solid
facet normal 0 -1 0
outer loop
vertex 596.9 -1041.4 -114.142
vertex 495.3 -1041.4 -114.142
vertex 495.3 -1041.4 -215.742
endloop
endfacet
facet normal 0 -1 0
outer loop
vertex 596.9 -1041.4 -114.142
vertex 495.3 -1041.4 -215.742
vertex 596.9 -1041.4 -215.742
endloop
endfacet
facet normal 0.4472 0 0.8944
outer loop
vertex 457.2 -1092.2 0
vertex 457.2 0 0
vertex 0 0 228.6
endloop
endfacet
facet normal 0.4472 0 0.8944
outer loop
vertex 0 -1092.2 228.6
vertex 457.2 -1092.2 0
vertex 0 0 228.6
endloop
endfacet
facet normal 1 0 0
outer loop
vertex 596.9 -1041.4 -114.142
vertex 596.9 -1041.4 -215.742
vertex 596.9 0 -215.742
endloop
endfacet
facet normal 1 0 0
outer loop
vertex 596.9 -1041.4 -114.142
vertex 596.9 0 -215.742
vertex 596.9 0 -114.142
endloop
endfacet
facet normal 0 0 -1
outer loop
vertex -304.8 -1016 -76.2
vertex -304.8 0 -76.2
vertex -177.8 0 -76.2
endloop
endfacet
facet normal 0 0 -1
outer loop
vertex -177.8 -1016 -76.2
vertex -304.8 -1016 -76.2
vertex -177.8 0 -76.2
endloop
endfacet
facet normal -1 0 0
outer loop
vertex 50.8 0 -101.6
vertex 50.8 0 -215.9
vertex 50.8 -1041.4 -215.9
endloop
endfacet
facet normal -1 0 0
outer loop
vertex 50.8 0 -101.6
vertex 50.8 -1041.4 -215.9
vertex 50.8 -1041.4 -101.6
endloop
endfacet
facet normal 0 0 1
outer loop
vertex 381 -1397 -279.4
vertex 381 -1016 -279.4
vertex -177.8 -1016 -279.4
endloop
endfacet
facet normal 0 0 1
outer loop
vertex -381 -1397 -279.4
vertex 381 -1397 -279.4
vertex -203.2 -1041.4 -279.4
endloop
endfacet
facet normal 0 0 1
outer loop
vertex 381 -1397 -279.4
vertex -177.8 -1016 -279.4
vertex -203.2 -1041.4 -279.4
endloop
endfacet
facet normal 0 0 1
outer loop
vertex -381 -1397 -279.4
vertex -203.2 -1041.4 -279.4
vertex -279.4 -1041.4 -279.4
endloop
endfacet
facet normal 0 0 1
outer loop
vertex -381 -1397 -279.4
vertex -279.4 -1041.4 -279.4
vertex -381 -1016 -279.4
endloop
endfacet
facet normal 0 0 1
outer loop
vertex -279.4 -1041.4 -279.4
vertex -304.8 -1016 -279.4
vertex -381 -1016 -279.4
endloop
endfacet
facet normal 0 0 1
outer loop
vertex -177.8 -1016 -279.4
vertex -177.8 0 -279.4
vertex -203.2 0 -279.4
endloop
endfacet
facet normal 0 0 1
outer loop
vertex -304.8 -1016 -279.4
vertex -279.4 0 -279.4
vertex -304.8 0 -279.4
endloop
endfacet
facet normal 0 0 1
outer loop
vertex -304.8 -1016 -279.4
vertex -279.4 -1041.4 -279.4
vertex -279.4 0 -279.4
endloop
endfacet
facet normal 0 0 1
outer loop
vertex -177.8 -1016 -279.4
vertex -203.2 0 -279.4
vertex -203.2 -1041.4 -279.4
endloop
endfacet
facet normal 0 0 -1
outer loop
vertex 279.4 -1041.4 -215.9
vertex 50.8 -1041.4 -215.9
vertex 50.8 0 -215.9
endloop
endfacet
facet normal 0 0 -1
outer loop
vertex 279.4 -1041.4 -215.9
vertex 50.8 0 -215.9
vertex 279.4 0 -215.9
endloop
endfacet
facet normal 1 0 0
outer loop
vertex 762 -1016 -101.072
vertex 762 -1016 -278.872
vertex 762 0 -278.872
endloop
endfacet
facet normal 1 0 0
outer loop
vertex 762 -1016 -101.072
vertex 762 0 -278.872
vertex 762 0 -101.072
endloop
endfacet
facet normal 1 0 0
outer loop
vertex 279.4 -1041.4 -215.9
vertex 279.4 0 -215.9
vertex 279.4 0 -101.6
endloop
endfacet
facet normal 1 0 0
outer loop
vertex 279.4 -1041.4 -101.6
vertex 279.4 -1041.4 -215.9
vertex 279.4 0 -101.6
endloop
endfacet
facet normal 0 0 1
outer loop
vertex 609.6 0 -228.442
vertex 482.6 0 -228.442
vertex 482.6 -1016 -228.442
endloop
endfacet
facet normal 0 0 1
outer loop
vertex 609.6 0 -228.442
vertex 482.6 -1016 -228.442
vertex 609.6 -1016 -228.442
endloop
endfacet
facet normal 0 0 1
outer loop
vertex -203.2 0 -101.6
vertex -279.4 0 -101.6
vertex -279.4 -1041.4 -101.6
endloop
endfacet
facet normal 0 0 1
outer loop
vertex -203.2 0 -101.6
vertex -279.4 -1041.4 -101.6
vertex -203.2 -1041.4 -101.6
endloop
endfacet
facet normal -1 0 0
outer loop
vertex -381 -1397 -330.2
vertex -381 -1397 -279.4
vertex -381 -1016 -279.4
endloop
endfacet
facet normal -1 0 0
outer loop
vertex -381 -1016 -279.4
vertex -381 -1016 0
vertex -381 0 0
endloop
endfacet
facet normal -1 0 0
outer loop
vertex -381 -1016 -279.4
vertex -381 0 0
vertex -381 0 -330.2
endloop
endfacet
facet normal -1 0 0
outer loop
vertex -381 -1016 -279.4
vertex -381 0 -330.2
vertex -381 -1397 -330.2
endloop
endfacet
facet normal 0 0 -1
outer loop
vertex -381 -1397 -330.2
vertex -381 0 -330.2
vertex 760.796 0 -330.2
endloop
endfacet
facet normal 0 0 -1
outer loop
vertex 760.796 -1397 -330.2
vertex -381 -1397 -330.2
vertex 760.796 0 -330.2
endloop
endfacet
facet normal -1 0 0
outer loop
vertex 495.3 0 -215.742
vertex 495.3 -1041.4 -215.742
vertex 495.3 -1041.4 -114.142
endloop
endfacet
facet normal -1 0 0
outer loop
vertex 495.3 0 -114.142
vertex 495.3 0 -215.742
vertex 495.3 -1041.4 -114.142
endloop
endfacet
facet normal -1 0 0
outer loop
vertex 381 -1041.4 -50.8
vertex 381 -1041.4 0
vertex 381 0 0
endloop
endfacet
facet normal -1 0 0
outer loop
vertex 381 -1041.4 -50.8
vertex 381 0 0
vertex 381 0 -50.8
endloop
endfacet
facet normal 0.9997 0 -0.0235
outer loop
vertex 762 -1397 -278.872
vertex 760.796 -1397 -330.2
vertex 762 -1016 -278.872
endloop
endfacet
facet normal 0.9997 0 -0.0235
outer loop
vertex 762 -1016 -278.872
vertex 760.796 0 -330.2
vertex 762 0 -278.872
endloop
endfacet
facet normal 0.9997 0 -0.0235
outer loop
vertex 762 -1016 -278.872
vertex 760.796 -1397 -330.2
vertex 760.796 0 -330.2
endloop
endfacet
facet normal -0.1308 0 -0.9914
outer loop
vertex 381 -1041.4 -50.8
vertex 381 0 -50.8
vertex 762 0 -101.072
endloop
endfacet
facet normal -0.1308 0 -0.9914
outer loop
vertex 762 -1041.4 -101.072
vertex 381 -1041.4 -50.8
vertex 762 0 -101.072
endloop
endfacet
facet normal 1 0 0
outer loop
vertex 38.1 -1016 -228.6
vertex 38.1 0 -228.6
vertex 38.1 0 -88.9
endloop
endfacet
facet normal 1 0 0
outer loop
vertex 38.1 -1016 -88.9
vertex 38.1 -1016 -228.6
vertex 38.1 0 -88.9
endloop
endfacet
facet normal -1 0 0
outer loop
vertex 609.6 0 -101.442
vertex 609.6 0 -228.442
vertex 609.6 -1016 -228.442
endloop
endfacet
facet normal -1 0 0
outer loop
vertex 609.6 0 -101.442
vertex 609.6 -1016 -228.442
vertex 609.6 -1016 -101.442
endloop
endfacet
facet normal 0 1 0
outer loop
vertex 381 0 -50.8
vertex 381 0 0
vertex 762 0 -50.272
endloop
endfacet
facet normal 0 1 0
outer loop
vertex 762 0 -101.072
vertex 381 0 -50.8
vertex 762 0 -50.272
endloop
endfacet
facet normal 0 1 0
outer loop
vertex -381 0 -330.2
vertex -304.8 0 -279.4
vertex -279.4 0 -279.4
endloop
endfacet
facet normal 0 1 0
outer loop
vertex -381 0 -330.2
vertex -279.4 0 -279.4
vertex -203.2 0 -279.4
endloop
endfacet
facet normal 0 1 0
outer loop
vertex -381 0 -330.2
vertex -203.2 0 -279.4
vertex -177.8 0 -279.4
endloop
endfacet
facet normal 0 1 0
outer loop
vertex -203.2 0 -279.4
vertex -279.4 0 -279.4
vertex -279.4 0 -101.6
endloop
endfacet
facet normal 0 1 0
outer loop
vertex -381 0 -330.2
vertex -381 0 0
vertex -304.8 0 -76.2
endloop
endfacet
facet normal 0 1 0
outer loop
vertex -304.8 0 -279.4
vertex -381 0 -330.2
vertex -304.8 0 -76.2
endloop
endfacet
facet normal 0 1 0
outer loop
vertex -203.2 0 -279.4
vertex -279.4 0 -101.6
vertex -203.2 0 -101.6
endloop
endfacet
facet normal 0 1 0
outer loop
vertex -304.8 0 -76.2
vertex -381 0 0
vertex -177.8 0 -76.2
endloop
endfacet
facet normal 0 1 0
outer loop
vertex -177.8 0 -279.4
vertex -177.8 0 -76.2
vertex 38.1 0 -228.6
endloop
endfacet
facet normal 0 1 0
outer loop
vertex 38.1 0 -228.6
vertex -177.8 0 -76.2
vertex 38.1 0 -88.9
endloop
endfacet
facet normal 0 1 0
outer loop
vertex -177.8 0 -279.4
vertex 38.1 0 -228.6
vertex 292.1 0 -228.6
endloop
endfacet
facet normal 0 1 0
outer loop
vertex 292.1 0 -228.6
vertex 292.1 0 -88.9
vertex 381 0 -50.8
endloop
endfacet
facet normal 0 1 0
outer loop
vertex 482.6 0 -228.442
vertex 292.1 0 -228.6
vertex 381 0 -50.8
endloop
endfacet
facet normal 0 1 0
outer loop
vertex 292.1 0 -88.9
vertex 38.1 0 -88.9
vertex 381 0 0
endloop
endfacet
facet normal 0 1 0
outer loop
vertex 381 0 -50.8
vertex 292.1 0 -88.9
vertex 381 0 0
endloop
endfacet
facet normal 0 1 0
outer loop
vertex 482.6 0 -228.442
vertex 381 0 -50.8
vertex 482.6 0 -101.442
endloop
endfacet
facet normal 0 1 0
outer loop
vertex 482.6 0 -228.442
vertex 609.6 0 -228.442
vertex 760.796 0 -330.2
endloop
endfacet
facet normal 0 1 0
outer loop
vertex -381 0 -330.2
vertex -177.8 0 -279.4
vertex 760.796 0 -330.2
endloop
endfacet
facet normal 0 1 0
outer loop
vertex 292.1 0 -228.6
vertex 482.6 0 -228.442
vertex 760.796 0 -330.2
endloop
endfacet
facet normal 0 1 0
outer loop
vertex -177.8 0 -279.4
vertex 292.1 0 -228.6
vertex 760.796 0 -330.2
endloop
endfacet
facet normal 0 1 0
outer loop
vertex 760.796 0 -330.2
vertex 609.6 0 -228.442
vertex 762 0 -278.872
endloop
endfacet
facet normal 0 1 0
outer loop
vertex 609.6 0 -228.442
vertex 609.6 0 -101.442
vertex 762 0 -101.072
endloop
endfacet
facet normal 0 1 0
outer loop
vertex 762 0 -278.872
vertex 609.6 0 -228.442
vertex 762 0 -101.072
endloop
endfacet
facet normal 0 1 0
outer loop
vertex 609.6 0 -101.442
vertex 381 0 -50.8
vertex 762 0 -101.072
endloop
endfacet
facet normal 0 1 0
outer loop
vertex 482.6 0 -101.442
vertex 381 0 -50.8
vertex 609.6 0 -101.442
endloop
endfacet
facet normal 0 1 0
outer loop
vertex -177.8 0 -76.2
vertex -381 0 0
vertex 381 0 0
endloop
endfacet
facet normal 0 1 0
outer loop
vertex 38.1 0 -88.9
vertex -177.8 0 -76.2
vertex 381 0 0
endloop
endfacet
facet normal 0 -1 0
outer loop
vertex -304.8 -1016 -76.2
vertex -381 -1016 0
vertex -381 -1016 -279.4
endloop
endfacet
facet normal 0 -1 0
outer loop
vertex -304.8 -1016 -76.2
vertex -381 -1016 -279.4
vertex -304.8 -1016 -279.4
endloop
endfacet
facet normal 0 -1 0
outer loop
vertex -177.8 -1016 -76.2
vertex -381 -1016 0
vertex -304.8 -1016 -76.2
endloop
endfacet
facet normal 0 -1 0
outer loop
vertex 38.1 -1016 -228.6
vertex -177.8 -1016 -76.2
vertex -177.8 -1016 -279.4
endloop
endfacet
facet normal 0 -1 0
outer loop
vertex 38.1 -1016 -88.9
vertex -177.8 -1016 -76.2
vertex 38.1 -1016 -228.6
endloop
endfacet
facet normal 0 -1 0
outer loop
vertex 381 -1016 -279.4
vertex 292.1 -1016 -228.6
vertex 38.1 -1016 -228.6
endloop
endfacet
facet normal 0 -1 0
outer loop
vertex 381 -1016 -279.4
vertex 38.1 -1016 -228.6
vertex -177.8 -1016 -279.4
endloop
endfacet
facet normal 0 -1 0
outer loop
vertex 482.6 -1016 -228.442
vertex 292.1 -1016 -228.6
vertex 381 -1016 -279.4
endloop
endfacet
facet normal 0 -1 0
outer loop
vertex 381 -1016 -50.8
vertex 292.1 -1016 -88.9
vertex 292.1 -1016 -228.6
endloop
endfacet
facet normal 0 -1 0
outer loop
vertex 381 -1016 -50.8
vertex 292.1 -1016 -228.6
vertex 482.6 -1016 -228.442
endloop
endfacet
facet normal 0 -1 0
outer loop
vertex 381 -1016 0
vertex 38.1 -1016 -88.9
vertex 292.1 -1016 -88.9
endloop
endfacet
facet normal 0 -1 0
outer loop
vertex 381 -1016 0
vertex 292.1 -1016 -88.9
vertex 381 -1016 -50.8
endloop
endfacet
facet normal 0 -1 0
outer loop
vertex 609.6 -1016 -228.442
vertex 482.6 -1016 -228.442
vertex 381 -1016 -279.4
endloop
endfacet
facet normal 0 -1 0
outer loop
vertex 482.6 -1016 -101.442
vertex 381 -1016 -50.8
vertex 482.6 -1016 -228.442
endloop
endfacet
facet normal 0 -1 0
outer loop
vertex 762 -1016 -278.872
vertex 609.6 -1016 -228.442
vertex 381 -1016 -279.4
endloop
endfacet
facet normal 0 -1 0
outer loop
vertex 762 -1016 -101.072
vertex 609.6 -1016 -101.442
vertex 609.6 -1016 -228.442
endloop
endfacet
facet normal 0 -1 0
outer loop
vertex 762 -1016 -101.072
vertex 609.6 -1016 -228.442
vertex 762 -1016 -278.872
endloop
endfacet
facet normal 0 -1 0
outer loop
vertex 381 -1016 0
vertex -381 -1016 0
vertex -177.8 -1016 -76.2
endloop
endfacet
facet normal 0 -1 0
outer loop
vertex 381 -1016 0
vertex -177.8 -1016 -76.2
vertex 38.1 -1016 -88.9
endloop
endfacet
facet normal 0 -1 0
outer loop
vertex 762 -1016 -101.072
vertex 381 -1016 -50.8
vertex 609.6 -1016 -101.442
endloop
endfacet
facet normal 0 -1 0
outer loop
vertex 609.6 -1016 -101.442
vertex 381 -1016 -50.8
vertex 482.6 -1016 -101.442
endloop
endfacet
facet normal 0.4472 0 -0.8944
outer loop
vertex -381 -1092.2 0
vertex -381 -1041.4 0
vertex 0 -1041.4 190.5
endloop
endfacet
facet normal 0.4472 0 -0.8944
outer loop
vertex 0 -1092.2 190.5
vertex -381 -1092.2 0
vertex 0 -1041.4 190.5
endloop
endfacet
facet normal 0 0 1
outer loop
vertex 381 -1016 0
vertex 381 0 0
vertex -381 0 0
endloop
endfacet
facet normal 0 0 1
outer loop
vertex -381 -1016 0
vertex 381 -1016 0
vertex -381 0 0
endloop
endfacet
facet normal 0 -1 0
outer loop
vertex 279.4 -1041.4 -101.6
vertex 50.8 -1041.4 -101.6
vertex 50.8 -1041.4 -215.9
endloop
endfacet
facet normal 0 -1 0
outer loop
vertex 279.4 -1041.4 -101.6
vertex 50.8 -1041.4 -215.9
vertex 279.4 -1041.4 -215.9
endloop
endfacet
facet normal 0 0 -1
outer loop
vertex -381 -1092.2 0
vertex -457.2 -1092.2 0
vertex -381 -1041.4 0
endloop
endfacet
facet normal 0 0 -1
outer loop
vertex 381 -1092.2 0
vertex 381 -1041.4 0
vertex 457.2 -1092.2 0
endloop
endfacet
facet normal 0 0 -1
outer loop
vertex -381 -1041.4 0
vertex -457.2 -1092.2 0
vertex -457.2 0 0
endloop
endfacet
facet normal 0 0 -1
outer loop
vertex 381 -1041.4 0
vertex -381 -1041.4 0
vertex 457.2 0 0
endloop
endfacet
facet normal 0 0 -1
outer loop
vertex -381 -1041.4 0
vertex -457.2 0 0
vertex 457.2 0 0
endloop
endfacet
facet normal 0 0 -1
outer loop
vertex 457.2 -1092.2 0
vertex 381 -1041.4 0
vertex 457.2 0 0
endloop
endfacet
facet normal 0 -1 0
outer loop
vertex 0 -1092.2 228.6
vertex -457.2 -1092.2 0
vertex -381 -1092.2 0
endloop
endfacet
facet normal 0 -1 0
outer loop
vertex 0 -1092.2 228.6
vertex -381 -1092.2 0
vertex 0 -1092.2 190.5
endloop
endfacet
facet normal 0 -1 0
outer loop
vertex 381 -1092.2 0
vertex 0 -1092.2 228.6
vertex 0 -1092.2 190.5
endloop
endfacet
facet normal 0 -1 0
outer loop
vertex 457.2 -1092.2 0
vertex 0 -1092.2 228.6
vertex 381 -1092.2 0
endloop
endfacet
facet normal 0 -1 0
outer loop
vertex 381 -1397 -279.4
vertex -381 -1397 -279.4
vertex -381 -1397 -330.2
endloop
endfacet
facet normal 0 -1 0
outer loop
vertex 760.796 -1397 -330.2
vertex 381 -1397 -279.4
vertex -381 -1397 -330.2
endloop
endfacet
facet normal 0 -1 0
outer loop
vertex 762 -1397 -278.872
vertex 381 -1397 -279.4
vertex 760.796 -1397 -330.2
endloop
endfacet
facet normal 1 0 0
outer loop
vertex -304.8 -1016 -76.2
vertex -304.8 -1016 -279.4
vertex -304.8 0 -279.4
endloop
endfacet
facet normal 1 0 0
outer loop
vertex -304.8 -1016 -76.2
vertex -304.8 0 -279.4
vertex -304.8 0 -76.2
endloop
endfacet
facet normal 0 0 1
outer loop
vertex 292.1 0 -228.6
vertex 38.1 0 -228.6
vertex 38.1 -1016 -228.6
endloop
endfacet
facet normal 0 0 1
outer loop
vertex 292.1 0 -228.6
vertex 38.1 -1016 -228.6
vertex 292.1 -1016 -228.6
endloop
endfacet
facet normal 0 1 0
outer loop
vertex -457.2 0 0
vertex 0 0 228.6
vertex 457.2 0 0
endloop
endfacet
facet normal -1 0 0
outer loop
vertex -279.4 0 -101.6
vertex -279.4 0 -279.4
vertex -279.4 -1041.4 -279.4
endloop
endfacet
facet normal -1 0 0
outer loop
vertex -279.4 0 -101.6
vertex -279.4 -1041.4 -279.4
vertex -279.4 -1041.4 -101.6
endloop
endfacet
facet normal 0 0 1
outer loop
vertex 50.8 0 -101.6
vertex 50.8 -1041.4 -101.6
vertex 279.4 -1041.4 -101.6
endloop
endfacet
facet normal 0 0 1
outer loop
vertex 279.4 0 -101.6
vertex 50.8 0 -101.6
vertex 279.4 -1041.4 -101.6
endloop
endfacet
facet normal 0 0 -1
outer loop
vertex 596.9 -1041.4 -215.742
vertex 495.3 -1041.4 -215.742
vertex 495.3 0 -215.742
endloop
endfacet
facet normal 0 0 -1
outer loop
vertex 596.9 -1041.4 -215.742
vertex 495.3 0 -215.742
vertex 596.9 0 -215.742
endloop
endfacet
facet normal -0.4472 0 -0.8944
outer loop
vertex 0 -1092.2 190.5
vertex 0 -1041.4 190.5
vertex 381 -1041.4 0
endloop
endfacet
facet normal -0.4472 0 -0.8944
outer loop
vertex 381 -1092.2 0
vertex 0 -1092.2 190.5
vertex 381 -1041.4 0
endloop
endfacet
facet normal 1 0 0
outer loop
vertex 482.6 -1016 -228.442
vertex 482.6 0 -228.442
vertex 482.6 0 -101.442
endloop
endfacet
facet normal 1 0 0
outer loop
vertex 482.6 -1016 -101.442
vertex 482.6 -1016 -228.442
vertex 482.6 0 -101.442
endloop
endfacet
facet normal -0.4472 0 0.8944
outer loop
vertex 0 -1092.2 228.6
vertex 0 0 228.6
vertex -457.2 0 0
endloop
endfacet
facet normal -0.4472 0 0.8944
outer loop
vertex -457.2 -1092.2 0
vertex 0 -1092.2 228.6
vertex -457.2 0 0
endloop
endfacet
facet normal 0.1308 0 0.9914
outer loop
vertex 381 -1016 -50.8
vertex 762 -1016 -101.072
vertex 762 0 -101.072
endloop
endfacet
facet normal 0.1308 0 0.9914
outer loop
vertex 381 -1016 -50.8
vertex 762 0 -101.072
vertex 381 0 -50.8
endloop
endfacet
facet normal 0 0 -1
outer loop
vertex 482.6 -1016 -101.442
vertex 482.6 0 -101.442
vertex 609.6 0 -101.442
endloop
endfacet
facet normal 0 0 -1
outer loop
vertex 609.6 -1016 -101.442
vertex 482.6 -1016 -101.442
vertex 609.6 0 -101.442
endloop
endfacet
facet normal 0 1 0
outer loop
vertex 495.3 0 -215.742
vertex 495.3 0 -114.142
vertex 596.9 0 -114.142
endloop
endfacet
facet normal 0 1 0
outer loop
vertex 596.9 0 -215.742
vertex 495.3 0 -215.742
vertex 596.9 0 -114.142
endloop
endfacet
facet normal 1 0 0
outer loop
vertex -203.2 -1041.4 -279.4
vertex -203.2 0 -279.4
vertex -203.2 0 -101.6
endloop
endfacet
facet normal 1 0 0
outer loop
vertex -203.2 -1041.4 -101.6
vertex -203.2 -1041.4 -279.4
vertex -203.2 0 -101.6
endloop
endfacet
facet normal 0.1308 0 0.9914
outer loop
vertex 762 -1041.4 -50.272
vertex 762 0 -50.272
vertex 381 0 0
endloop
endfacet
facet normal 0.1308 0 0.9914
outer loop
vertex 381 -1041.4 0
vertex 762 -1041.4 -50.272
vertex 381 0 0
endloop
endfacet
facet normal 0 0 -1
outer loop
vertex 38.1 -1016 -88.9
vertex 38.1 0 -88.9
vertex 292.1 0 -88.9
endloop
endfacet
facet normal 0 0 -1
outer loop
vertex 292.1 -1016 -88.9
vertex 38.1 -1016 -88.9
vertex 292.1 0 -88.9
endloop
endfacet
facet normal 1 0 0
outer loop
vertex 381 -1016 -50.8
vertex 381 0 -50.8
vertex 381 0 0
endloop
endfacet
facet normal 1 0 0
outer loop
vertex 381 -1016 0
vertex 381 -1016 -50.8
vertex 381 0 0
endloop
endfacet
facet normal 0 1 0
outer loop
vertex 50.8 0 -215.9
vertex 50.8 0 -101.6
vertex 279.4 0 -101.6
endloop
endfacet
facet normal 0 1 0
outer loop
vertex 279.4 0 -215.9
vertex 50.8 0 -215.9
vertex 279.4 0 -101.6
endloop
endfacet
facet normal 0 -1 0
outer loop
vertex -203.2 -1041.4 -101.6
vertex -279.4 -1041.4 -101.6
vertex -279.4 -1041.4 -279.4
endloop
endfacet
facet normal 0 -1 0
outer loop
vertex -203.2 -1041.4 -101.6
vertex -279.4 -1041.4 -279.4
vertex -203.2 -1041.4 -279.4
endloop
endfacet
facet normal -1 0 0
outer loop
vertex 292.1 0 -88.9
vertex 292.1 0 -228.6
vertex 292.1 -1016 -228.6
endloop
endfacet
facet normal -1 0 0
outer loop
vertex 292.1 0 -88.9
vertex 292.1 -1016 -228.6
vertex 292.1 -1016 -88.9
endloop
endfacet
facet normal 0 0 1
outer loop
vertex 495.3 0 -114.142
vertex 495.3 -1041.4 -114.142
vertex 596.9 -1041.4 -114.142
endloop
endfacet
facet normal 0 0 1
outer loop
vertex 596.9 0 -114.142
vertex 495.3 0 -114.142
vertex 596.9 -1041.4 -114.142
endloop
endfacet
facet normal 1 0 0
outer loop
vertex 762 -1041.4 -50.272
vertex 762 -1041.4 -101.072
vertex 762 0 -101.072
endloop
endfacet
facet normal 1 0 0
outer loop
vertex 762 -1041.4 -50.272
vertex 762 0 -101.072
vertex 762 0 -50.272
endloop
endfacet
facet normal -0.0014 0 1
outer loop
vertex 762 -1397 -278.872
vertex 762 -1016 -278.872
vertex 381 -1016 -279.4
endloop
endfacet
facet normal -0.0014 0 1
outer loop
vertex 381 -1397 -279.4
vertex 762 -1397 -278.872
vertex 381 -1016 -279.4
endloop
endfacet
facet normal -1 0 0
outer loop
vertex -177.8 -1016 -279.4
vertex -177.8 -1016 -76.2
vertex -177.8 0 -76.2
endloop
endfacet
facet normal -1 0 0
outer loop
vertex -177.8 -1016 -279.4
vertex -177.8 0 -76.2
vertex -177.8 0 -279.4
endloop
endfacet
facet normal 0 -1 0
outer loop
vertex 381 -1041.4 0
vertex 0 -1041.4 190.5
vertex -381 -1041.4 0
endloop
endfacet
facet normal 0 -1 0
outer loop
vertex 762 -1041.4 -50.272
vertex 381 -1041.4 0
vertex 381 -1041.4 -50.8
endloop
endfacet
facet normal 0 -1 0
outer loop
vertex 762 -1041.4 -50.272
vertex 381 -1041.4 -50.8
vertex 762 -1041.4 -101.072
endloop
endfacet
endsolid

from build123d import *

# Parameters (mm, degrees)
F1_DEPTH = 1092.2
F2_DEPTH = 1041.4
F3_DEPTH = 1041.4
F0_W     = 254
F0_H     = 139.7
F0_W_2   = 127
F0_H_2   = 127
F4_DEPTH = 1016
F5_DEPTH = 1397
F0_W_3   = 101.6
F0_H_3   = 101.6
F6_DEPTH = 1041.4
F0_W_4   = 228.6
F0_H_4   = 114.3
F0_W_5   = 76.2
F0_H_5   = 177.8


with BuildPart() as f1:
    # F0 (on Front) → F1 (new body)
    with BuildSketch(Plane.XZ):
        Polygon((-457.2, 0), (-381, 0), (0, 190.5), (0, 228.6), align=None)
        Polygon((0, 190.5), (381, 0), (457.2, 0), (0, 228.6), align=None)
    extrude(amount=F1_DEPTH)

    # F0 (on Front) → F2 (join)
    with BuildSketch(Plane.XZ):
        Polygon((-381, 0), (0, 0), (0, 190.5), align=None)
        Polygon((0, 190.5), (0, 0), (381, 0), align=None)
    extrude(amount=F2_DEPTH)


with BuildPart() as f3:
    # F0 (on Front) → F3 (new body)
    with BuildSketch(Plane.XZ):
        Polygon((761.999634578, -50.272315), (381, 0), (381, -50.8), (761.999634578, -101.072315), align=None)
    extrude(amount=F3_DEPTH)


with BuildPart() as f4:
    # F0 (on Front) → F4 (new body)
    with BuildSketch(Plane.XZ):
        Polygon((381, 0), (0, 0), (-381, 0), (-381, -279.4), (-304.8, -279.4), (-304.8, -76.2), (-177.8, -76.2), (-177.8, -279.4), (381, -279.4), (381, -50.8), align=None)
        with Locations((165.1, -158.75)):
            Rectangle(F0_W, F0_H, mode=Mode.SUBTRACT)
        Polygon((761.999634578, -101.072315), (381, -50.8), (381, -279.4), (761.999634578, -278.872315), align=None)
        with Locations((546.099634578, -164.9416339505)):
            Rectangle(F0_W_2, F0_H_2, mode=Mode.SUBTRACT)
    extrude(amount=F4_DEPTH)

    # F0 (on Front) → F5 (join)
    with BuildSketch(Plane.XZ):
        Polygon((-304.8, -279.4), (-381, -279.4), (-381, -330.2), (760.7958912849, -330.2), (761.999634578, -278.872315), (381, -279.4), (-177.8, -279.4), (-203.2, -279.4), (-279.4, -279.4), align=None)
    extrude(amount=F5_DEPTH)

    # F0 (on Front) → F6, piece 3 (join)
    with BuildSketch(Plane.XZ):
        with Locations((-241.3, -190.5)):
            Rectangle(F0_W_5, F0_H_5)
    extrude(amount=F6_DEPTH)


with BuildPart() as f6:
    # F0 (on Front) → F6 (new body)
    with BuildSketch(Plane.XZ):
        with Locations((546.099634578, -164.9416339505)):
            Rectangle(F0_W_3, F0_H_3)
    extrude(amount=F6_DEPTH)


with BuildPart() as f6b:
    # F0 (on Front) → F6, piece 2 (new body)
    with BuildSketch(Plane.XZ):
        with Locations((165.1, -158.75)):
            Rectangle(F0_W_4, F0_H_4)
    extrude(amount=F6_DEPTH)


solid = Compound([f1.part, f3.part, f4.part, f6.part, f6b.part])
